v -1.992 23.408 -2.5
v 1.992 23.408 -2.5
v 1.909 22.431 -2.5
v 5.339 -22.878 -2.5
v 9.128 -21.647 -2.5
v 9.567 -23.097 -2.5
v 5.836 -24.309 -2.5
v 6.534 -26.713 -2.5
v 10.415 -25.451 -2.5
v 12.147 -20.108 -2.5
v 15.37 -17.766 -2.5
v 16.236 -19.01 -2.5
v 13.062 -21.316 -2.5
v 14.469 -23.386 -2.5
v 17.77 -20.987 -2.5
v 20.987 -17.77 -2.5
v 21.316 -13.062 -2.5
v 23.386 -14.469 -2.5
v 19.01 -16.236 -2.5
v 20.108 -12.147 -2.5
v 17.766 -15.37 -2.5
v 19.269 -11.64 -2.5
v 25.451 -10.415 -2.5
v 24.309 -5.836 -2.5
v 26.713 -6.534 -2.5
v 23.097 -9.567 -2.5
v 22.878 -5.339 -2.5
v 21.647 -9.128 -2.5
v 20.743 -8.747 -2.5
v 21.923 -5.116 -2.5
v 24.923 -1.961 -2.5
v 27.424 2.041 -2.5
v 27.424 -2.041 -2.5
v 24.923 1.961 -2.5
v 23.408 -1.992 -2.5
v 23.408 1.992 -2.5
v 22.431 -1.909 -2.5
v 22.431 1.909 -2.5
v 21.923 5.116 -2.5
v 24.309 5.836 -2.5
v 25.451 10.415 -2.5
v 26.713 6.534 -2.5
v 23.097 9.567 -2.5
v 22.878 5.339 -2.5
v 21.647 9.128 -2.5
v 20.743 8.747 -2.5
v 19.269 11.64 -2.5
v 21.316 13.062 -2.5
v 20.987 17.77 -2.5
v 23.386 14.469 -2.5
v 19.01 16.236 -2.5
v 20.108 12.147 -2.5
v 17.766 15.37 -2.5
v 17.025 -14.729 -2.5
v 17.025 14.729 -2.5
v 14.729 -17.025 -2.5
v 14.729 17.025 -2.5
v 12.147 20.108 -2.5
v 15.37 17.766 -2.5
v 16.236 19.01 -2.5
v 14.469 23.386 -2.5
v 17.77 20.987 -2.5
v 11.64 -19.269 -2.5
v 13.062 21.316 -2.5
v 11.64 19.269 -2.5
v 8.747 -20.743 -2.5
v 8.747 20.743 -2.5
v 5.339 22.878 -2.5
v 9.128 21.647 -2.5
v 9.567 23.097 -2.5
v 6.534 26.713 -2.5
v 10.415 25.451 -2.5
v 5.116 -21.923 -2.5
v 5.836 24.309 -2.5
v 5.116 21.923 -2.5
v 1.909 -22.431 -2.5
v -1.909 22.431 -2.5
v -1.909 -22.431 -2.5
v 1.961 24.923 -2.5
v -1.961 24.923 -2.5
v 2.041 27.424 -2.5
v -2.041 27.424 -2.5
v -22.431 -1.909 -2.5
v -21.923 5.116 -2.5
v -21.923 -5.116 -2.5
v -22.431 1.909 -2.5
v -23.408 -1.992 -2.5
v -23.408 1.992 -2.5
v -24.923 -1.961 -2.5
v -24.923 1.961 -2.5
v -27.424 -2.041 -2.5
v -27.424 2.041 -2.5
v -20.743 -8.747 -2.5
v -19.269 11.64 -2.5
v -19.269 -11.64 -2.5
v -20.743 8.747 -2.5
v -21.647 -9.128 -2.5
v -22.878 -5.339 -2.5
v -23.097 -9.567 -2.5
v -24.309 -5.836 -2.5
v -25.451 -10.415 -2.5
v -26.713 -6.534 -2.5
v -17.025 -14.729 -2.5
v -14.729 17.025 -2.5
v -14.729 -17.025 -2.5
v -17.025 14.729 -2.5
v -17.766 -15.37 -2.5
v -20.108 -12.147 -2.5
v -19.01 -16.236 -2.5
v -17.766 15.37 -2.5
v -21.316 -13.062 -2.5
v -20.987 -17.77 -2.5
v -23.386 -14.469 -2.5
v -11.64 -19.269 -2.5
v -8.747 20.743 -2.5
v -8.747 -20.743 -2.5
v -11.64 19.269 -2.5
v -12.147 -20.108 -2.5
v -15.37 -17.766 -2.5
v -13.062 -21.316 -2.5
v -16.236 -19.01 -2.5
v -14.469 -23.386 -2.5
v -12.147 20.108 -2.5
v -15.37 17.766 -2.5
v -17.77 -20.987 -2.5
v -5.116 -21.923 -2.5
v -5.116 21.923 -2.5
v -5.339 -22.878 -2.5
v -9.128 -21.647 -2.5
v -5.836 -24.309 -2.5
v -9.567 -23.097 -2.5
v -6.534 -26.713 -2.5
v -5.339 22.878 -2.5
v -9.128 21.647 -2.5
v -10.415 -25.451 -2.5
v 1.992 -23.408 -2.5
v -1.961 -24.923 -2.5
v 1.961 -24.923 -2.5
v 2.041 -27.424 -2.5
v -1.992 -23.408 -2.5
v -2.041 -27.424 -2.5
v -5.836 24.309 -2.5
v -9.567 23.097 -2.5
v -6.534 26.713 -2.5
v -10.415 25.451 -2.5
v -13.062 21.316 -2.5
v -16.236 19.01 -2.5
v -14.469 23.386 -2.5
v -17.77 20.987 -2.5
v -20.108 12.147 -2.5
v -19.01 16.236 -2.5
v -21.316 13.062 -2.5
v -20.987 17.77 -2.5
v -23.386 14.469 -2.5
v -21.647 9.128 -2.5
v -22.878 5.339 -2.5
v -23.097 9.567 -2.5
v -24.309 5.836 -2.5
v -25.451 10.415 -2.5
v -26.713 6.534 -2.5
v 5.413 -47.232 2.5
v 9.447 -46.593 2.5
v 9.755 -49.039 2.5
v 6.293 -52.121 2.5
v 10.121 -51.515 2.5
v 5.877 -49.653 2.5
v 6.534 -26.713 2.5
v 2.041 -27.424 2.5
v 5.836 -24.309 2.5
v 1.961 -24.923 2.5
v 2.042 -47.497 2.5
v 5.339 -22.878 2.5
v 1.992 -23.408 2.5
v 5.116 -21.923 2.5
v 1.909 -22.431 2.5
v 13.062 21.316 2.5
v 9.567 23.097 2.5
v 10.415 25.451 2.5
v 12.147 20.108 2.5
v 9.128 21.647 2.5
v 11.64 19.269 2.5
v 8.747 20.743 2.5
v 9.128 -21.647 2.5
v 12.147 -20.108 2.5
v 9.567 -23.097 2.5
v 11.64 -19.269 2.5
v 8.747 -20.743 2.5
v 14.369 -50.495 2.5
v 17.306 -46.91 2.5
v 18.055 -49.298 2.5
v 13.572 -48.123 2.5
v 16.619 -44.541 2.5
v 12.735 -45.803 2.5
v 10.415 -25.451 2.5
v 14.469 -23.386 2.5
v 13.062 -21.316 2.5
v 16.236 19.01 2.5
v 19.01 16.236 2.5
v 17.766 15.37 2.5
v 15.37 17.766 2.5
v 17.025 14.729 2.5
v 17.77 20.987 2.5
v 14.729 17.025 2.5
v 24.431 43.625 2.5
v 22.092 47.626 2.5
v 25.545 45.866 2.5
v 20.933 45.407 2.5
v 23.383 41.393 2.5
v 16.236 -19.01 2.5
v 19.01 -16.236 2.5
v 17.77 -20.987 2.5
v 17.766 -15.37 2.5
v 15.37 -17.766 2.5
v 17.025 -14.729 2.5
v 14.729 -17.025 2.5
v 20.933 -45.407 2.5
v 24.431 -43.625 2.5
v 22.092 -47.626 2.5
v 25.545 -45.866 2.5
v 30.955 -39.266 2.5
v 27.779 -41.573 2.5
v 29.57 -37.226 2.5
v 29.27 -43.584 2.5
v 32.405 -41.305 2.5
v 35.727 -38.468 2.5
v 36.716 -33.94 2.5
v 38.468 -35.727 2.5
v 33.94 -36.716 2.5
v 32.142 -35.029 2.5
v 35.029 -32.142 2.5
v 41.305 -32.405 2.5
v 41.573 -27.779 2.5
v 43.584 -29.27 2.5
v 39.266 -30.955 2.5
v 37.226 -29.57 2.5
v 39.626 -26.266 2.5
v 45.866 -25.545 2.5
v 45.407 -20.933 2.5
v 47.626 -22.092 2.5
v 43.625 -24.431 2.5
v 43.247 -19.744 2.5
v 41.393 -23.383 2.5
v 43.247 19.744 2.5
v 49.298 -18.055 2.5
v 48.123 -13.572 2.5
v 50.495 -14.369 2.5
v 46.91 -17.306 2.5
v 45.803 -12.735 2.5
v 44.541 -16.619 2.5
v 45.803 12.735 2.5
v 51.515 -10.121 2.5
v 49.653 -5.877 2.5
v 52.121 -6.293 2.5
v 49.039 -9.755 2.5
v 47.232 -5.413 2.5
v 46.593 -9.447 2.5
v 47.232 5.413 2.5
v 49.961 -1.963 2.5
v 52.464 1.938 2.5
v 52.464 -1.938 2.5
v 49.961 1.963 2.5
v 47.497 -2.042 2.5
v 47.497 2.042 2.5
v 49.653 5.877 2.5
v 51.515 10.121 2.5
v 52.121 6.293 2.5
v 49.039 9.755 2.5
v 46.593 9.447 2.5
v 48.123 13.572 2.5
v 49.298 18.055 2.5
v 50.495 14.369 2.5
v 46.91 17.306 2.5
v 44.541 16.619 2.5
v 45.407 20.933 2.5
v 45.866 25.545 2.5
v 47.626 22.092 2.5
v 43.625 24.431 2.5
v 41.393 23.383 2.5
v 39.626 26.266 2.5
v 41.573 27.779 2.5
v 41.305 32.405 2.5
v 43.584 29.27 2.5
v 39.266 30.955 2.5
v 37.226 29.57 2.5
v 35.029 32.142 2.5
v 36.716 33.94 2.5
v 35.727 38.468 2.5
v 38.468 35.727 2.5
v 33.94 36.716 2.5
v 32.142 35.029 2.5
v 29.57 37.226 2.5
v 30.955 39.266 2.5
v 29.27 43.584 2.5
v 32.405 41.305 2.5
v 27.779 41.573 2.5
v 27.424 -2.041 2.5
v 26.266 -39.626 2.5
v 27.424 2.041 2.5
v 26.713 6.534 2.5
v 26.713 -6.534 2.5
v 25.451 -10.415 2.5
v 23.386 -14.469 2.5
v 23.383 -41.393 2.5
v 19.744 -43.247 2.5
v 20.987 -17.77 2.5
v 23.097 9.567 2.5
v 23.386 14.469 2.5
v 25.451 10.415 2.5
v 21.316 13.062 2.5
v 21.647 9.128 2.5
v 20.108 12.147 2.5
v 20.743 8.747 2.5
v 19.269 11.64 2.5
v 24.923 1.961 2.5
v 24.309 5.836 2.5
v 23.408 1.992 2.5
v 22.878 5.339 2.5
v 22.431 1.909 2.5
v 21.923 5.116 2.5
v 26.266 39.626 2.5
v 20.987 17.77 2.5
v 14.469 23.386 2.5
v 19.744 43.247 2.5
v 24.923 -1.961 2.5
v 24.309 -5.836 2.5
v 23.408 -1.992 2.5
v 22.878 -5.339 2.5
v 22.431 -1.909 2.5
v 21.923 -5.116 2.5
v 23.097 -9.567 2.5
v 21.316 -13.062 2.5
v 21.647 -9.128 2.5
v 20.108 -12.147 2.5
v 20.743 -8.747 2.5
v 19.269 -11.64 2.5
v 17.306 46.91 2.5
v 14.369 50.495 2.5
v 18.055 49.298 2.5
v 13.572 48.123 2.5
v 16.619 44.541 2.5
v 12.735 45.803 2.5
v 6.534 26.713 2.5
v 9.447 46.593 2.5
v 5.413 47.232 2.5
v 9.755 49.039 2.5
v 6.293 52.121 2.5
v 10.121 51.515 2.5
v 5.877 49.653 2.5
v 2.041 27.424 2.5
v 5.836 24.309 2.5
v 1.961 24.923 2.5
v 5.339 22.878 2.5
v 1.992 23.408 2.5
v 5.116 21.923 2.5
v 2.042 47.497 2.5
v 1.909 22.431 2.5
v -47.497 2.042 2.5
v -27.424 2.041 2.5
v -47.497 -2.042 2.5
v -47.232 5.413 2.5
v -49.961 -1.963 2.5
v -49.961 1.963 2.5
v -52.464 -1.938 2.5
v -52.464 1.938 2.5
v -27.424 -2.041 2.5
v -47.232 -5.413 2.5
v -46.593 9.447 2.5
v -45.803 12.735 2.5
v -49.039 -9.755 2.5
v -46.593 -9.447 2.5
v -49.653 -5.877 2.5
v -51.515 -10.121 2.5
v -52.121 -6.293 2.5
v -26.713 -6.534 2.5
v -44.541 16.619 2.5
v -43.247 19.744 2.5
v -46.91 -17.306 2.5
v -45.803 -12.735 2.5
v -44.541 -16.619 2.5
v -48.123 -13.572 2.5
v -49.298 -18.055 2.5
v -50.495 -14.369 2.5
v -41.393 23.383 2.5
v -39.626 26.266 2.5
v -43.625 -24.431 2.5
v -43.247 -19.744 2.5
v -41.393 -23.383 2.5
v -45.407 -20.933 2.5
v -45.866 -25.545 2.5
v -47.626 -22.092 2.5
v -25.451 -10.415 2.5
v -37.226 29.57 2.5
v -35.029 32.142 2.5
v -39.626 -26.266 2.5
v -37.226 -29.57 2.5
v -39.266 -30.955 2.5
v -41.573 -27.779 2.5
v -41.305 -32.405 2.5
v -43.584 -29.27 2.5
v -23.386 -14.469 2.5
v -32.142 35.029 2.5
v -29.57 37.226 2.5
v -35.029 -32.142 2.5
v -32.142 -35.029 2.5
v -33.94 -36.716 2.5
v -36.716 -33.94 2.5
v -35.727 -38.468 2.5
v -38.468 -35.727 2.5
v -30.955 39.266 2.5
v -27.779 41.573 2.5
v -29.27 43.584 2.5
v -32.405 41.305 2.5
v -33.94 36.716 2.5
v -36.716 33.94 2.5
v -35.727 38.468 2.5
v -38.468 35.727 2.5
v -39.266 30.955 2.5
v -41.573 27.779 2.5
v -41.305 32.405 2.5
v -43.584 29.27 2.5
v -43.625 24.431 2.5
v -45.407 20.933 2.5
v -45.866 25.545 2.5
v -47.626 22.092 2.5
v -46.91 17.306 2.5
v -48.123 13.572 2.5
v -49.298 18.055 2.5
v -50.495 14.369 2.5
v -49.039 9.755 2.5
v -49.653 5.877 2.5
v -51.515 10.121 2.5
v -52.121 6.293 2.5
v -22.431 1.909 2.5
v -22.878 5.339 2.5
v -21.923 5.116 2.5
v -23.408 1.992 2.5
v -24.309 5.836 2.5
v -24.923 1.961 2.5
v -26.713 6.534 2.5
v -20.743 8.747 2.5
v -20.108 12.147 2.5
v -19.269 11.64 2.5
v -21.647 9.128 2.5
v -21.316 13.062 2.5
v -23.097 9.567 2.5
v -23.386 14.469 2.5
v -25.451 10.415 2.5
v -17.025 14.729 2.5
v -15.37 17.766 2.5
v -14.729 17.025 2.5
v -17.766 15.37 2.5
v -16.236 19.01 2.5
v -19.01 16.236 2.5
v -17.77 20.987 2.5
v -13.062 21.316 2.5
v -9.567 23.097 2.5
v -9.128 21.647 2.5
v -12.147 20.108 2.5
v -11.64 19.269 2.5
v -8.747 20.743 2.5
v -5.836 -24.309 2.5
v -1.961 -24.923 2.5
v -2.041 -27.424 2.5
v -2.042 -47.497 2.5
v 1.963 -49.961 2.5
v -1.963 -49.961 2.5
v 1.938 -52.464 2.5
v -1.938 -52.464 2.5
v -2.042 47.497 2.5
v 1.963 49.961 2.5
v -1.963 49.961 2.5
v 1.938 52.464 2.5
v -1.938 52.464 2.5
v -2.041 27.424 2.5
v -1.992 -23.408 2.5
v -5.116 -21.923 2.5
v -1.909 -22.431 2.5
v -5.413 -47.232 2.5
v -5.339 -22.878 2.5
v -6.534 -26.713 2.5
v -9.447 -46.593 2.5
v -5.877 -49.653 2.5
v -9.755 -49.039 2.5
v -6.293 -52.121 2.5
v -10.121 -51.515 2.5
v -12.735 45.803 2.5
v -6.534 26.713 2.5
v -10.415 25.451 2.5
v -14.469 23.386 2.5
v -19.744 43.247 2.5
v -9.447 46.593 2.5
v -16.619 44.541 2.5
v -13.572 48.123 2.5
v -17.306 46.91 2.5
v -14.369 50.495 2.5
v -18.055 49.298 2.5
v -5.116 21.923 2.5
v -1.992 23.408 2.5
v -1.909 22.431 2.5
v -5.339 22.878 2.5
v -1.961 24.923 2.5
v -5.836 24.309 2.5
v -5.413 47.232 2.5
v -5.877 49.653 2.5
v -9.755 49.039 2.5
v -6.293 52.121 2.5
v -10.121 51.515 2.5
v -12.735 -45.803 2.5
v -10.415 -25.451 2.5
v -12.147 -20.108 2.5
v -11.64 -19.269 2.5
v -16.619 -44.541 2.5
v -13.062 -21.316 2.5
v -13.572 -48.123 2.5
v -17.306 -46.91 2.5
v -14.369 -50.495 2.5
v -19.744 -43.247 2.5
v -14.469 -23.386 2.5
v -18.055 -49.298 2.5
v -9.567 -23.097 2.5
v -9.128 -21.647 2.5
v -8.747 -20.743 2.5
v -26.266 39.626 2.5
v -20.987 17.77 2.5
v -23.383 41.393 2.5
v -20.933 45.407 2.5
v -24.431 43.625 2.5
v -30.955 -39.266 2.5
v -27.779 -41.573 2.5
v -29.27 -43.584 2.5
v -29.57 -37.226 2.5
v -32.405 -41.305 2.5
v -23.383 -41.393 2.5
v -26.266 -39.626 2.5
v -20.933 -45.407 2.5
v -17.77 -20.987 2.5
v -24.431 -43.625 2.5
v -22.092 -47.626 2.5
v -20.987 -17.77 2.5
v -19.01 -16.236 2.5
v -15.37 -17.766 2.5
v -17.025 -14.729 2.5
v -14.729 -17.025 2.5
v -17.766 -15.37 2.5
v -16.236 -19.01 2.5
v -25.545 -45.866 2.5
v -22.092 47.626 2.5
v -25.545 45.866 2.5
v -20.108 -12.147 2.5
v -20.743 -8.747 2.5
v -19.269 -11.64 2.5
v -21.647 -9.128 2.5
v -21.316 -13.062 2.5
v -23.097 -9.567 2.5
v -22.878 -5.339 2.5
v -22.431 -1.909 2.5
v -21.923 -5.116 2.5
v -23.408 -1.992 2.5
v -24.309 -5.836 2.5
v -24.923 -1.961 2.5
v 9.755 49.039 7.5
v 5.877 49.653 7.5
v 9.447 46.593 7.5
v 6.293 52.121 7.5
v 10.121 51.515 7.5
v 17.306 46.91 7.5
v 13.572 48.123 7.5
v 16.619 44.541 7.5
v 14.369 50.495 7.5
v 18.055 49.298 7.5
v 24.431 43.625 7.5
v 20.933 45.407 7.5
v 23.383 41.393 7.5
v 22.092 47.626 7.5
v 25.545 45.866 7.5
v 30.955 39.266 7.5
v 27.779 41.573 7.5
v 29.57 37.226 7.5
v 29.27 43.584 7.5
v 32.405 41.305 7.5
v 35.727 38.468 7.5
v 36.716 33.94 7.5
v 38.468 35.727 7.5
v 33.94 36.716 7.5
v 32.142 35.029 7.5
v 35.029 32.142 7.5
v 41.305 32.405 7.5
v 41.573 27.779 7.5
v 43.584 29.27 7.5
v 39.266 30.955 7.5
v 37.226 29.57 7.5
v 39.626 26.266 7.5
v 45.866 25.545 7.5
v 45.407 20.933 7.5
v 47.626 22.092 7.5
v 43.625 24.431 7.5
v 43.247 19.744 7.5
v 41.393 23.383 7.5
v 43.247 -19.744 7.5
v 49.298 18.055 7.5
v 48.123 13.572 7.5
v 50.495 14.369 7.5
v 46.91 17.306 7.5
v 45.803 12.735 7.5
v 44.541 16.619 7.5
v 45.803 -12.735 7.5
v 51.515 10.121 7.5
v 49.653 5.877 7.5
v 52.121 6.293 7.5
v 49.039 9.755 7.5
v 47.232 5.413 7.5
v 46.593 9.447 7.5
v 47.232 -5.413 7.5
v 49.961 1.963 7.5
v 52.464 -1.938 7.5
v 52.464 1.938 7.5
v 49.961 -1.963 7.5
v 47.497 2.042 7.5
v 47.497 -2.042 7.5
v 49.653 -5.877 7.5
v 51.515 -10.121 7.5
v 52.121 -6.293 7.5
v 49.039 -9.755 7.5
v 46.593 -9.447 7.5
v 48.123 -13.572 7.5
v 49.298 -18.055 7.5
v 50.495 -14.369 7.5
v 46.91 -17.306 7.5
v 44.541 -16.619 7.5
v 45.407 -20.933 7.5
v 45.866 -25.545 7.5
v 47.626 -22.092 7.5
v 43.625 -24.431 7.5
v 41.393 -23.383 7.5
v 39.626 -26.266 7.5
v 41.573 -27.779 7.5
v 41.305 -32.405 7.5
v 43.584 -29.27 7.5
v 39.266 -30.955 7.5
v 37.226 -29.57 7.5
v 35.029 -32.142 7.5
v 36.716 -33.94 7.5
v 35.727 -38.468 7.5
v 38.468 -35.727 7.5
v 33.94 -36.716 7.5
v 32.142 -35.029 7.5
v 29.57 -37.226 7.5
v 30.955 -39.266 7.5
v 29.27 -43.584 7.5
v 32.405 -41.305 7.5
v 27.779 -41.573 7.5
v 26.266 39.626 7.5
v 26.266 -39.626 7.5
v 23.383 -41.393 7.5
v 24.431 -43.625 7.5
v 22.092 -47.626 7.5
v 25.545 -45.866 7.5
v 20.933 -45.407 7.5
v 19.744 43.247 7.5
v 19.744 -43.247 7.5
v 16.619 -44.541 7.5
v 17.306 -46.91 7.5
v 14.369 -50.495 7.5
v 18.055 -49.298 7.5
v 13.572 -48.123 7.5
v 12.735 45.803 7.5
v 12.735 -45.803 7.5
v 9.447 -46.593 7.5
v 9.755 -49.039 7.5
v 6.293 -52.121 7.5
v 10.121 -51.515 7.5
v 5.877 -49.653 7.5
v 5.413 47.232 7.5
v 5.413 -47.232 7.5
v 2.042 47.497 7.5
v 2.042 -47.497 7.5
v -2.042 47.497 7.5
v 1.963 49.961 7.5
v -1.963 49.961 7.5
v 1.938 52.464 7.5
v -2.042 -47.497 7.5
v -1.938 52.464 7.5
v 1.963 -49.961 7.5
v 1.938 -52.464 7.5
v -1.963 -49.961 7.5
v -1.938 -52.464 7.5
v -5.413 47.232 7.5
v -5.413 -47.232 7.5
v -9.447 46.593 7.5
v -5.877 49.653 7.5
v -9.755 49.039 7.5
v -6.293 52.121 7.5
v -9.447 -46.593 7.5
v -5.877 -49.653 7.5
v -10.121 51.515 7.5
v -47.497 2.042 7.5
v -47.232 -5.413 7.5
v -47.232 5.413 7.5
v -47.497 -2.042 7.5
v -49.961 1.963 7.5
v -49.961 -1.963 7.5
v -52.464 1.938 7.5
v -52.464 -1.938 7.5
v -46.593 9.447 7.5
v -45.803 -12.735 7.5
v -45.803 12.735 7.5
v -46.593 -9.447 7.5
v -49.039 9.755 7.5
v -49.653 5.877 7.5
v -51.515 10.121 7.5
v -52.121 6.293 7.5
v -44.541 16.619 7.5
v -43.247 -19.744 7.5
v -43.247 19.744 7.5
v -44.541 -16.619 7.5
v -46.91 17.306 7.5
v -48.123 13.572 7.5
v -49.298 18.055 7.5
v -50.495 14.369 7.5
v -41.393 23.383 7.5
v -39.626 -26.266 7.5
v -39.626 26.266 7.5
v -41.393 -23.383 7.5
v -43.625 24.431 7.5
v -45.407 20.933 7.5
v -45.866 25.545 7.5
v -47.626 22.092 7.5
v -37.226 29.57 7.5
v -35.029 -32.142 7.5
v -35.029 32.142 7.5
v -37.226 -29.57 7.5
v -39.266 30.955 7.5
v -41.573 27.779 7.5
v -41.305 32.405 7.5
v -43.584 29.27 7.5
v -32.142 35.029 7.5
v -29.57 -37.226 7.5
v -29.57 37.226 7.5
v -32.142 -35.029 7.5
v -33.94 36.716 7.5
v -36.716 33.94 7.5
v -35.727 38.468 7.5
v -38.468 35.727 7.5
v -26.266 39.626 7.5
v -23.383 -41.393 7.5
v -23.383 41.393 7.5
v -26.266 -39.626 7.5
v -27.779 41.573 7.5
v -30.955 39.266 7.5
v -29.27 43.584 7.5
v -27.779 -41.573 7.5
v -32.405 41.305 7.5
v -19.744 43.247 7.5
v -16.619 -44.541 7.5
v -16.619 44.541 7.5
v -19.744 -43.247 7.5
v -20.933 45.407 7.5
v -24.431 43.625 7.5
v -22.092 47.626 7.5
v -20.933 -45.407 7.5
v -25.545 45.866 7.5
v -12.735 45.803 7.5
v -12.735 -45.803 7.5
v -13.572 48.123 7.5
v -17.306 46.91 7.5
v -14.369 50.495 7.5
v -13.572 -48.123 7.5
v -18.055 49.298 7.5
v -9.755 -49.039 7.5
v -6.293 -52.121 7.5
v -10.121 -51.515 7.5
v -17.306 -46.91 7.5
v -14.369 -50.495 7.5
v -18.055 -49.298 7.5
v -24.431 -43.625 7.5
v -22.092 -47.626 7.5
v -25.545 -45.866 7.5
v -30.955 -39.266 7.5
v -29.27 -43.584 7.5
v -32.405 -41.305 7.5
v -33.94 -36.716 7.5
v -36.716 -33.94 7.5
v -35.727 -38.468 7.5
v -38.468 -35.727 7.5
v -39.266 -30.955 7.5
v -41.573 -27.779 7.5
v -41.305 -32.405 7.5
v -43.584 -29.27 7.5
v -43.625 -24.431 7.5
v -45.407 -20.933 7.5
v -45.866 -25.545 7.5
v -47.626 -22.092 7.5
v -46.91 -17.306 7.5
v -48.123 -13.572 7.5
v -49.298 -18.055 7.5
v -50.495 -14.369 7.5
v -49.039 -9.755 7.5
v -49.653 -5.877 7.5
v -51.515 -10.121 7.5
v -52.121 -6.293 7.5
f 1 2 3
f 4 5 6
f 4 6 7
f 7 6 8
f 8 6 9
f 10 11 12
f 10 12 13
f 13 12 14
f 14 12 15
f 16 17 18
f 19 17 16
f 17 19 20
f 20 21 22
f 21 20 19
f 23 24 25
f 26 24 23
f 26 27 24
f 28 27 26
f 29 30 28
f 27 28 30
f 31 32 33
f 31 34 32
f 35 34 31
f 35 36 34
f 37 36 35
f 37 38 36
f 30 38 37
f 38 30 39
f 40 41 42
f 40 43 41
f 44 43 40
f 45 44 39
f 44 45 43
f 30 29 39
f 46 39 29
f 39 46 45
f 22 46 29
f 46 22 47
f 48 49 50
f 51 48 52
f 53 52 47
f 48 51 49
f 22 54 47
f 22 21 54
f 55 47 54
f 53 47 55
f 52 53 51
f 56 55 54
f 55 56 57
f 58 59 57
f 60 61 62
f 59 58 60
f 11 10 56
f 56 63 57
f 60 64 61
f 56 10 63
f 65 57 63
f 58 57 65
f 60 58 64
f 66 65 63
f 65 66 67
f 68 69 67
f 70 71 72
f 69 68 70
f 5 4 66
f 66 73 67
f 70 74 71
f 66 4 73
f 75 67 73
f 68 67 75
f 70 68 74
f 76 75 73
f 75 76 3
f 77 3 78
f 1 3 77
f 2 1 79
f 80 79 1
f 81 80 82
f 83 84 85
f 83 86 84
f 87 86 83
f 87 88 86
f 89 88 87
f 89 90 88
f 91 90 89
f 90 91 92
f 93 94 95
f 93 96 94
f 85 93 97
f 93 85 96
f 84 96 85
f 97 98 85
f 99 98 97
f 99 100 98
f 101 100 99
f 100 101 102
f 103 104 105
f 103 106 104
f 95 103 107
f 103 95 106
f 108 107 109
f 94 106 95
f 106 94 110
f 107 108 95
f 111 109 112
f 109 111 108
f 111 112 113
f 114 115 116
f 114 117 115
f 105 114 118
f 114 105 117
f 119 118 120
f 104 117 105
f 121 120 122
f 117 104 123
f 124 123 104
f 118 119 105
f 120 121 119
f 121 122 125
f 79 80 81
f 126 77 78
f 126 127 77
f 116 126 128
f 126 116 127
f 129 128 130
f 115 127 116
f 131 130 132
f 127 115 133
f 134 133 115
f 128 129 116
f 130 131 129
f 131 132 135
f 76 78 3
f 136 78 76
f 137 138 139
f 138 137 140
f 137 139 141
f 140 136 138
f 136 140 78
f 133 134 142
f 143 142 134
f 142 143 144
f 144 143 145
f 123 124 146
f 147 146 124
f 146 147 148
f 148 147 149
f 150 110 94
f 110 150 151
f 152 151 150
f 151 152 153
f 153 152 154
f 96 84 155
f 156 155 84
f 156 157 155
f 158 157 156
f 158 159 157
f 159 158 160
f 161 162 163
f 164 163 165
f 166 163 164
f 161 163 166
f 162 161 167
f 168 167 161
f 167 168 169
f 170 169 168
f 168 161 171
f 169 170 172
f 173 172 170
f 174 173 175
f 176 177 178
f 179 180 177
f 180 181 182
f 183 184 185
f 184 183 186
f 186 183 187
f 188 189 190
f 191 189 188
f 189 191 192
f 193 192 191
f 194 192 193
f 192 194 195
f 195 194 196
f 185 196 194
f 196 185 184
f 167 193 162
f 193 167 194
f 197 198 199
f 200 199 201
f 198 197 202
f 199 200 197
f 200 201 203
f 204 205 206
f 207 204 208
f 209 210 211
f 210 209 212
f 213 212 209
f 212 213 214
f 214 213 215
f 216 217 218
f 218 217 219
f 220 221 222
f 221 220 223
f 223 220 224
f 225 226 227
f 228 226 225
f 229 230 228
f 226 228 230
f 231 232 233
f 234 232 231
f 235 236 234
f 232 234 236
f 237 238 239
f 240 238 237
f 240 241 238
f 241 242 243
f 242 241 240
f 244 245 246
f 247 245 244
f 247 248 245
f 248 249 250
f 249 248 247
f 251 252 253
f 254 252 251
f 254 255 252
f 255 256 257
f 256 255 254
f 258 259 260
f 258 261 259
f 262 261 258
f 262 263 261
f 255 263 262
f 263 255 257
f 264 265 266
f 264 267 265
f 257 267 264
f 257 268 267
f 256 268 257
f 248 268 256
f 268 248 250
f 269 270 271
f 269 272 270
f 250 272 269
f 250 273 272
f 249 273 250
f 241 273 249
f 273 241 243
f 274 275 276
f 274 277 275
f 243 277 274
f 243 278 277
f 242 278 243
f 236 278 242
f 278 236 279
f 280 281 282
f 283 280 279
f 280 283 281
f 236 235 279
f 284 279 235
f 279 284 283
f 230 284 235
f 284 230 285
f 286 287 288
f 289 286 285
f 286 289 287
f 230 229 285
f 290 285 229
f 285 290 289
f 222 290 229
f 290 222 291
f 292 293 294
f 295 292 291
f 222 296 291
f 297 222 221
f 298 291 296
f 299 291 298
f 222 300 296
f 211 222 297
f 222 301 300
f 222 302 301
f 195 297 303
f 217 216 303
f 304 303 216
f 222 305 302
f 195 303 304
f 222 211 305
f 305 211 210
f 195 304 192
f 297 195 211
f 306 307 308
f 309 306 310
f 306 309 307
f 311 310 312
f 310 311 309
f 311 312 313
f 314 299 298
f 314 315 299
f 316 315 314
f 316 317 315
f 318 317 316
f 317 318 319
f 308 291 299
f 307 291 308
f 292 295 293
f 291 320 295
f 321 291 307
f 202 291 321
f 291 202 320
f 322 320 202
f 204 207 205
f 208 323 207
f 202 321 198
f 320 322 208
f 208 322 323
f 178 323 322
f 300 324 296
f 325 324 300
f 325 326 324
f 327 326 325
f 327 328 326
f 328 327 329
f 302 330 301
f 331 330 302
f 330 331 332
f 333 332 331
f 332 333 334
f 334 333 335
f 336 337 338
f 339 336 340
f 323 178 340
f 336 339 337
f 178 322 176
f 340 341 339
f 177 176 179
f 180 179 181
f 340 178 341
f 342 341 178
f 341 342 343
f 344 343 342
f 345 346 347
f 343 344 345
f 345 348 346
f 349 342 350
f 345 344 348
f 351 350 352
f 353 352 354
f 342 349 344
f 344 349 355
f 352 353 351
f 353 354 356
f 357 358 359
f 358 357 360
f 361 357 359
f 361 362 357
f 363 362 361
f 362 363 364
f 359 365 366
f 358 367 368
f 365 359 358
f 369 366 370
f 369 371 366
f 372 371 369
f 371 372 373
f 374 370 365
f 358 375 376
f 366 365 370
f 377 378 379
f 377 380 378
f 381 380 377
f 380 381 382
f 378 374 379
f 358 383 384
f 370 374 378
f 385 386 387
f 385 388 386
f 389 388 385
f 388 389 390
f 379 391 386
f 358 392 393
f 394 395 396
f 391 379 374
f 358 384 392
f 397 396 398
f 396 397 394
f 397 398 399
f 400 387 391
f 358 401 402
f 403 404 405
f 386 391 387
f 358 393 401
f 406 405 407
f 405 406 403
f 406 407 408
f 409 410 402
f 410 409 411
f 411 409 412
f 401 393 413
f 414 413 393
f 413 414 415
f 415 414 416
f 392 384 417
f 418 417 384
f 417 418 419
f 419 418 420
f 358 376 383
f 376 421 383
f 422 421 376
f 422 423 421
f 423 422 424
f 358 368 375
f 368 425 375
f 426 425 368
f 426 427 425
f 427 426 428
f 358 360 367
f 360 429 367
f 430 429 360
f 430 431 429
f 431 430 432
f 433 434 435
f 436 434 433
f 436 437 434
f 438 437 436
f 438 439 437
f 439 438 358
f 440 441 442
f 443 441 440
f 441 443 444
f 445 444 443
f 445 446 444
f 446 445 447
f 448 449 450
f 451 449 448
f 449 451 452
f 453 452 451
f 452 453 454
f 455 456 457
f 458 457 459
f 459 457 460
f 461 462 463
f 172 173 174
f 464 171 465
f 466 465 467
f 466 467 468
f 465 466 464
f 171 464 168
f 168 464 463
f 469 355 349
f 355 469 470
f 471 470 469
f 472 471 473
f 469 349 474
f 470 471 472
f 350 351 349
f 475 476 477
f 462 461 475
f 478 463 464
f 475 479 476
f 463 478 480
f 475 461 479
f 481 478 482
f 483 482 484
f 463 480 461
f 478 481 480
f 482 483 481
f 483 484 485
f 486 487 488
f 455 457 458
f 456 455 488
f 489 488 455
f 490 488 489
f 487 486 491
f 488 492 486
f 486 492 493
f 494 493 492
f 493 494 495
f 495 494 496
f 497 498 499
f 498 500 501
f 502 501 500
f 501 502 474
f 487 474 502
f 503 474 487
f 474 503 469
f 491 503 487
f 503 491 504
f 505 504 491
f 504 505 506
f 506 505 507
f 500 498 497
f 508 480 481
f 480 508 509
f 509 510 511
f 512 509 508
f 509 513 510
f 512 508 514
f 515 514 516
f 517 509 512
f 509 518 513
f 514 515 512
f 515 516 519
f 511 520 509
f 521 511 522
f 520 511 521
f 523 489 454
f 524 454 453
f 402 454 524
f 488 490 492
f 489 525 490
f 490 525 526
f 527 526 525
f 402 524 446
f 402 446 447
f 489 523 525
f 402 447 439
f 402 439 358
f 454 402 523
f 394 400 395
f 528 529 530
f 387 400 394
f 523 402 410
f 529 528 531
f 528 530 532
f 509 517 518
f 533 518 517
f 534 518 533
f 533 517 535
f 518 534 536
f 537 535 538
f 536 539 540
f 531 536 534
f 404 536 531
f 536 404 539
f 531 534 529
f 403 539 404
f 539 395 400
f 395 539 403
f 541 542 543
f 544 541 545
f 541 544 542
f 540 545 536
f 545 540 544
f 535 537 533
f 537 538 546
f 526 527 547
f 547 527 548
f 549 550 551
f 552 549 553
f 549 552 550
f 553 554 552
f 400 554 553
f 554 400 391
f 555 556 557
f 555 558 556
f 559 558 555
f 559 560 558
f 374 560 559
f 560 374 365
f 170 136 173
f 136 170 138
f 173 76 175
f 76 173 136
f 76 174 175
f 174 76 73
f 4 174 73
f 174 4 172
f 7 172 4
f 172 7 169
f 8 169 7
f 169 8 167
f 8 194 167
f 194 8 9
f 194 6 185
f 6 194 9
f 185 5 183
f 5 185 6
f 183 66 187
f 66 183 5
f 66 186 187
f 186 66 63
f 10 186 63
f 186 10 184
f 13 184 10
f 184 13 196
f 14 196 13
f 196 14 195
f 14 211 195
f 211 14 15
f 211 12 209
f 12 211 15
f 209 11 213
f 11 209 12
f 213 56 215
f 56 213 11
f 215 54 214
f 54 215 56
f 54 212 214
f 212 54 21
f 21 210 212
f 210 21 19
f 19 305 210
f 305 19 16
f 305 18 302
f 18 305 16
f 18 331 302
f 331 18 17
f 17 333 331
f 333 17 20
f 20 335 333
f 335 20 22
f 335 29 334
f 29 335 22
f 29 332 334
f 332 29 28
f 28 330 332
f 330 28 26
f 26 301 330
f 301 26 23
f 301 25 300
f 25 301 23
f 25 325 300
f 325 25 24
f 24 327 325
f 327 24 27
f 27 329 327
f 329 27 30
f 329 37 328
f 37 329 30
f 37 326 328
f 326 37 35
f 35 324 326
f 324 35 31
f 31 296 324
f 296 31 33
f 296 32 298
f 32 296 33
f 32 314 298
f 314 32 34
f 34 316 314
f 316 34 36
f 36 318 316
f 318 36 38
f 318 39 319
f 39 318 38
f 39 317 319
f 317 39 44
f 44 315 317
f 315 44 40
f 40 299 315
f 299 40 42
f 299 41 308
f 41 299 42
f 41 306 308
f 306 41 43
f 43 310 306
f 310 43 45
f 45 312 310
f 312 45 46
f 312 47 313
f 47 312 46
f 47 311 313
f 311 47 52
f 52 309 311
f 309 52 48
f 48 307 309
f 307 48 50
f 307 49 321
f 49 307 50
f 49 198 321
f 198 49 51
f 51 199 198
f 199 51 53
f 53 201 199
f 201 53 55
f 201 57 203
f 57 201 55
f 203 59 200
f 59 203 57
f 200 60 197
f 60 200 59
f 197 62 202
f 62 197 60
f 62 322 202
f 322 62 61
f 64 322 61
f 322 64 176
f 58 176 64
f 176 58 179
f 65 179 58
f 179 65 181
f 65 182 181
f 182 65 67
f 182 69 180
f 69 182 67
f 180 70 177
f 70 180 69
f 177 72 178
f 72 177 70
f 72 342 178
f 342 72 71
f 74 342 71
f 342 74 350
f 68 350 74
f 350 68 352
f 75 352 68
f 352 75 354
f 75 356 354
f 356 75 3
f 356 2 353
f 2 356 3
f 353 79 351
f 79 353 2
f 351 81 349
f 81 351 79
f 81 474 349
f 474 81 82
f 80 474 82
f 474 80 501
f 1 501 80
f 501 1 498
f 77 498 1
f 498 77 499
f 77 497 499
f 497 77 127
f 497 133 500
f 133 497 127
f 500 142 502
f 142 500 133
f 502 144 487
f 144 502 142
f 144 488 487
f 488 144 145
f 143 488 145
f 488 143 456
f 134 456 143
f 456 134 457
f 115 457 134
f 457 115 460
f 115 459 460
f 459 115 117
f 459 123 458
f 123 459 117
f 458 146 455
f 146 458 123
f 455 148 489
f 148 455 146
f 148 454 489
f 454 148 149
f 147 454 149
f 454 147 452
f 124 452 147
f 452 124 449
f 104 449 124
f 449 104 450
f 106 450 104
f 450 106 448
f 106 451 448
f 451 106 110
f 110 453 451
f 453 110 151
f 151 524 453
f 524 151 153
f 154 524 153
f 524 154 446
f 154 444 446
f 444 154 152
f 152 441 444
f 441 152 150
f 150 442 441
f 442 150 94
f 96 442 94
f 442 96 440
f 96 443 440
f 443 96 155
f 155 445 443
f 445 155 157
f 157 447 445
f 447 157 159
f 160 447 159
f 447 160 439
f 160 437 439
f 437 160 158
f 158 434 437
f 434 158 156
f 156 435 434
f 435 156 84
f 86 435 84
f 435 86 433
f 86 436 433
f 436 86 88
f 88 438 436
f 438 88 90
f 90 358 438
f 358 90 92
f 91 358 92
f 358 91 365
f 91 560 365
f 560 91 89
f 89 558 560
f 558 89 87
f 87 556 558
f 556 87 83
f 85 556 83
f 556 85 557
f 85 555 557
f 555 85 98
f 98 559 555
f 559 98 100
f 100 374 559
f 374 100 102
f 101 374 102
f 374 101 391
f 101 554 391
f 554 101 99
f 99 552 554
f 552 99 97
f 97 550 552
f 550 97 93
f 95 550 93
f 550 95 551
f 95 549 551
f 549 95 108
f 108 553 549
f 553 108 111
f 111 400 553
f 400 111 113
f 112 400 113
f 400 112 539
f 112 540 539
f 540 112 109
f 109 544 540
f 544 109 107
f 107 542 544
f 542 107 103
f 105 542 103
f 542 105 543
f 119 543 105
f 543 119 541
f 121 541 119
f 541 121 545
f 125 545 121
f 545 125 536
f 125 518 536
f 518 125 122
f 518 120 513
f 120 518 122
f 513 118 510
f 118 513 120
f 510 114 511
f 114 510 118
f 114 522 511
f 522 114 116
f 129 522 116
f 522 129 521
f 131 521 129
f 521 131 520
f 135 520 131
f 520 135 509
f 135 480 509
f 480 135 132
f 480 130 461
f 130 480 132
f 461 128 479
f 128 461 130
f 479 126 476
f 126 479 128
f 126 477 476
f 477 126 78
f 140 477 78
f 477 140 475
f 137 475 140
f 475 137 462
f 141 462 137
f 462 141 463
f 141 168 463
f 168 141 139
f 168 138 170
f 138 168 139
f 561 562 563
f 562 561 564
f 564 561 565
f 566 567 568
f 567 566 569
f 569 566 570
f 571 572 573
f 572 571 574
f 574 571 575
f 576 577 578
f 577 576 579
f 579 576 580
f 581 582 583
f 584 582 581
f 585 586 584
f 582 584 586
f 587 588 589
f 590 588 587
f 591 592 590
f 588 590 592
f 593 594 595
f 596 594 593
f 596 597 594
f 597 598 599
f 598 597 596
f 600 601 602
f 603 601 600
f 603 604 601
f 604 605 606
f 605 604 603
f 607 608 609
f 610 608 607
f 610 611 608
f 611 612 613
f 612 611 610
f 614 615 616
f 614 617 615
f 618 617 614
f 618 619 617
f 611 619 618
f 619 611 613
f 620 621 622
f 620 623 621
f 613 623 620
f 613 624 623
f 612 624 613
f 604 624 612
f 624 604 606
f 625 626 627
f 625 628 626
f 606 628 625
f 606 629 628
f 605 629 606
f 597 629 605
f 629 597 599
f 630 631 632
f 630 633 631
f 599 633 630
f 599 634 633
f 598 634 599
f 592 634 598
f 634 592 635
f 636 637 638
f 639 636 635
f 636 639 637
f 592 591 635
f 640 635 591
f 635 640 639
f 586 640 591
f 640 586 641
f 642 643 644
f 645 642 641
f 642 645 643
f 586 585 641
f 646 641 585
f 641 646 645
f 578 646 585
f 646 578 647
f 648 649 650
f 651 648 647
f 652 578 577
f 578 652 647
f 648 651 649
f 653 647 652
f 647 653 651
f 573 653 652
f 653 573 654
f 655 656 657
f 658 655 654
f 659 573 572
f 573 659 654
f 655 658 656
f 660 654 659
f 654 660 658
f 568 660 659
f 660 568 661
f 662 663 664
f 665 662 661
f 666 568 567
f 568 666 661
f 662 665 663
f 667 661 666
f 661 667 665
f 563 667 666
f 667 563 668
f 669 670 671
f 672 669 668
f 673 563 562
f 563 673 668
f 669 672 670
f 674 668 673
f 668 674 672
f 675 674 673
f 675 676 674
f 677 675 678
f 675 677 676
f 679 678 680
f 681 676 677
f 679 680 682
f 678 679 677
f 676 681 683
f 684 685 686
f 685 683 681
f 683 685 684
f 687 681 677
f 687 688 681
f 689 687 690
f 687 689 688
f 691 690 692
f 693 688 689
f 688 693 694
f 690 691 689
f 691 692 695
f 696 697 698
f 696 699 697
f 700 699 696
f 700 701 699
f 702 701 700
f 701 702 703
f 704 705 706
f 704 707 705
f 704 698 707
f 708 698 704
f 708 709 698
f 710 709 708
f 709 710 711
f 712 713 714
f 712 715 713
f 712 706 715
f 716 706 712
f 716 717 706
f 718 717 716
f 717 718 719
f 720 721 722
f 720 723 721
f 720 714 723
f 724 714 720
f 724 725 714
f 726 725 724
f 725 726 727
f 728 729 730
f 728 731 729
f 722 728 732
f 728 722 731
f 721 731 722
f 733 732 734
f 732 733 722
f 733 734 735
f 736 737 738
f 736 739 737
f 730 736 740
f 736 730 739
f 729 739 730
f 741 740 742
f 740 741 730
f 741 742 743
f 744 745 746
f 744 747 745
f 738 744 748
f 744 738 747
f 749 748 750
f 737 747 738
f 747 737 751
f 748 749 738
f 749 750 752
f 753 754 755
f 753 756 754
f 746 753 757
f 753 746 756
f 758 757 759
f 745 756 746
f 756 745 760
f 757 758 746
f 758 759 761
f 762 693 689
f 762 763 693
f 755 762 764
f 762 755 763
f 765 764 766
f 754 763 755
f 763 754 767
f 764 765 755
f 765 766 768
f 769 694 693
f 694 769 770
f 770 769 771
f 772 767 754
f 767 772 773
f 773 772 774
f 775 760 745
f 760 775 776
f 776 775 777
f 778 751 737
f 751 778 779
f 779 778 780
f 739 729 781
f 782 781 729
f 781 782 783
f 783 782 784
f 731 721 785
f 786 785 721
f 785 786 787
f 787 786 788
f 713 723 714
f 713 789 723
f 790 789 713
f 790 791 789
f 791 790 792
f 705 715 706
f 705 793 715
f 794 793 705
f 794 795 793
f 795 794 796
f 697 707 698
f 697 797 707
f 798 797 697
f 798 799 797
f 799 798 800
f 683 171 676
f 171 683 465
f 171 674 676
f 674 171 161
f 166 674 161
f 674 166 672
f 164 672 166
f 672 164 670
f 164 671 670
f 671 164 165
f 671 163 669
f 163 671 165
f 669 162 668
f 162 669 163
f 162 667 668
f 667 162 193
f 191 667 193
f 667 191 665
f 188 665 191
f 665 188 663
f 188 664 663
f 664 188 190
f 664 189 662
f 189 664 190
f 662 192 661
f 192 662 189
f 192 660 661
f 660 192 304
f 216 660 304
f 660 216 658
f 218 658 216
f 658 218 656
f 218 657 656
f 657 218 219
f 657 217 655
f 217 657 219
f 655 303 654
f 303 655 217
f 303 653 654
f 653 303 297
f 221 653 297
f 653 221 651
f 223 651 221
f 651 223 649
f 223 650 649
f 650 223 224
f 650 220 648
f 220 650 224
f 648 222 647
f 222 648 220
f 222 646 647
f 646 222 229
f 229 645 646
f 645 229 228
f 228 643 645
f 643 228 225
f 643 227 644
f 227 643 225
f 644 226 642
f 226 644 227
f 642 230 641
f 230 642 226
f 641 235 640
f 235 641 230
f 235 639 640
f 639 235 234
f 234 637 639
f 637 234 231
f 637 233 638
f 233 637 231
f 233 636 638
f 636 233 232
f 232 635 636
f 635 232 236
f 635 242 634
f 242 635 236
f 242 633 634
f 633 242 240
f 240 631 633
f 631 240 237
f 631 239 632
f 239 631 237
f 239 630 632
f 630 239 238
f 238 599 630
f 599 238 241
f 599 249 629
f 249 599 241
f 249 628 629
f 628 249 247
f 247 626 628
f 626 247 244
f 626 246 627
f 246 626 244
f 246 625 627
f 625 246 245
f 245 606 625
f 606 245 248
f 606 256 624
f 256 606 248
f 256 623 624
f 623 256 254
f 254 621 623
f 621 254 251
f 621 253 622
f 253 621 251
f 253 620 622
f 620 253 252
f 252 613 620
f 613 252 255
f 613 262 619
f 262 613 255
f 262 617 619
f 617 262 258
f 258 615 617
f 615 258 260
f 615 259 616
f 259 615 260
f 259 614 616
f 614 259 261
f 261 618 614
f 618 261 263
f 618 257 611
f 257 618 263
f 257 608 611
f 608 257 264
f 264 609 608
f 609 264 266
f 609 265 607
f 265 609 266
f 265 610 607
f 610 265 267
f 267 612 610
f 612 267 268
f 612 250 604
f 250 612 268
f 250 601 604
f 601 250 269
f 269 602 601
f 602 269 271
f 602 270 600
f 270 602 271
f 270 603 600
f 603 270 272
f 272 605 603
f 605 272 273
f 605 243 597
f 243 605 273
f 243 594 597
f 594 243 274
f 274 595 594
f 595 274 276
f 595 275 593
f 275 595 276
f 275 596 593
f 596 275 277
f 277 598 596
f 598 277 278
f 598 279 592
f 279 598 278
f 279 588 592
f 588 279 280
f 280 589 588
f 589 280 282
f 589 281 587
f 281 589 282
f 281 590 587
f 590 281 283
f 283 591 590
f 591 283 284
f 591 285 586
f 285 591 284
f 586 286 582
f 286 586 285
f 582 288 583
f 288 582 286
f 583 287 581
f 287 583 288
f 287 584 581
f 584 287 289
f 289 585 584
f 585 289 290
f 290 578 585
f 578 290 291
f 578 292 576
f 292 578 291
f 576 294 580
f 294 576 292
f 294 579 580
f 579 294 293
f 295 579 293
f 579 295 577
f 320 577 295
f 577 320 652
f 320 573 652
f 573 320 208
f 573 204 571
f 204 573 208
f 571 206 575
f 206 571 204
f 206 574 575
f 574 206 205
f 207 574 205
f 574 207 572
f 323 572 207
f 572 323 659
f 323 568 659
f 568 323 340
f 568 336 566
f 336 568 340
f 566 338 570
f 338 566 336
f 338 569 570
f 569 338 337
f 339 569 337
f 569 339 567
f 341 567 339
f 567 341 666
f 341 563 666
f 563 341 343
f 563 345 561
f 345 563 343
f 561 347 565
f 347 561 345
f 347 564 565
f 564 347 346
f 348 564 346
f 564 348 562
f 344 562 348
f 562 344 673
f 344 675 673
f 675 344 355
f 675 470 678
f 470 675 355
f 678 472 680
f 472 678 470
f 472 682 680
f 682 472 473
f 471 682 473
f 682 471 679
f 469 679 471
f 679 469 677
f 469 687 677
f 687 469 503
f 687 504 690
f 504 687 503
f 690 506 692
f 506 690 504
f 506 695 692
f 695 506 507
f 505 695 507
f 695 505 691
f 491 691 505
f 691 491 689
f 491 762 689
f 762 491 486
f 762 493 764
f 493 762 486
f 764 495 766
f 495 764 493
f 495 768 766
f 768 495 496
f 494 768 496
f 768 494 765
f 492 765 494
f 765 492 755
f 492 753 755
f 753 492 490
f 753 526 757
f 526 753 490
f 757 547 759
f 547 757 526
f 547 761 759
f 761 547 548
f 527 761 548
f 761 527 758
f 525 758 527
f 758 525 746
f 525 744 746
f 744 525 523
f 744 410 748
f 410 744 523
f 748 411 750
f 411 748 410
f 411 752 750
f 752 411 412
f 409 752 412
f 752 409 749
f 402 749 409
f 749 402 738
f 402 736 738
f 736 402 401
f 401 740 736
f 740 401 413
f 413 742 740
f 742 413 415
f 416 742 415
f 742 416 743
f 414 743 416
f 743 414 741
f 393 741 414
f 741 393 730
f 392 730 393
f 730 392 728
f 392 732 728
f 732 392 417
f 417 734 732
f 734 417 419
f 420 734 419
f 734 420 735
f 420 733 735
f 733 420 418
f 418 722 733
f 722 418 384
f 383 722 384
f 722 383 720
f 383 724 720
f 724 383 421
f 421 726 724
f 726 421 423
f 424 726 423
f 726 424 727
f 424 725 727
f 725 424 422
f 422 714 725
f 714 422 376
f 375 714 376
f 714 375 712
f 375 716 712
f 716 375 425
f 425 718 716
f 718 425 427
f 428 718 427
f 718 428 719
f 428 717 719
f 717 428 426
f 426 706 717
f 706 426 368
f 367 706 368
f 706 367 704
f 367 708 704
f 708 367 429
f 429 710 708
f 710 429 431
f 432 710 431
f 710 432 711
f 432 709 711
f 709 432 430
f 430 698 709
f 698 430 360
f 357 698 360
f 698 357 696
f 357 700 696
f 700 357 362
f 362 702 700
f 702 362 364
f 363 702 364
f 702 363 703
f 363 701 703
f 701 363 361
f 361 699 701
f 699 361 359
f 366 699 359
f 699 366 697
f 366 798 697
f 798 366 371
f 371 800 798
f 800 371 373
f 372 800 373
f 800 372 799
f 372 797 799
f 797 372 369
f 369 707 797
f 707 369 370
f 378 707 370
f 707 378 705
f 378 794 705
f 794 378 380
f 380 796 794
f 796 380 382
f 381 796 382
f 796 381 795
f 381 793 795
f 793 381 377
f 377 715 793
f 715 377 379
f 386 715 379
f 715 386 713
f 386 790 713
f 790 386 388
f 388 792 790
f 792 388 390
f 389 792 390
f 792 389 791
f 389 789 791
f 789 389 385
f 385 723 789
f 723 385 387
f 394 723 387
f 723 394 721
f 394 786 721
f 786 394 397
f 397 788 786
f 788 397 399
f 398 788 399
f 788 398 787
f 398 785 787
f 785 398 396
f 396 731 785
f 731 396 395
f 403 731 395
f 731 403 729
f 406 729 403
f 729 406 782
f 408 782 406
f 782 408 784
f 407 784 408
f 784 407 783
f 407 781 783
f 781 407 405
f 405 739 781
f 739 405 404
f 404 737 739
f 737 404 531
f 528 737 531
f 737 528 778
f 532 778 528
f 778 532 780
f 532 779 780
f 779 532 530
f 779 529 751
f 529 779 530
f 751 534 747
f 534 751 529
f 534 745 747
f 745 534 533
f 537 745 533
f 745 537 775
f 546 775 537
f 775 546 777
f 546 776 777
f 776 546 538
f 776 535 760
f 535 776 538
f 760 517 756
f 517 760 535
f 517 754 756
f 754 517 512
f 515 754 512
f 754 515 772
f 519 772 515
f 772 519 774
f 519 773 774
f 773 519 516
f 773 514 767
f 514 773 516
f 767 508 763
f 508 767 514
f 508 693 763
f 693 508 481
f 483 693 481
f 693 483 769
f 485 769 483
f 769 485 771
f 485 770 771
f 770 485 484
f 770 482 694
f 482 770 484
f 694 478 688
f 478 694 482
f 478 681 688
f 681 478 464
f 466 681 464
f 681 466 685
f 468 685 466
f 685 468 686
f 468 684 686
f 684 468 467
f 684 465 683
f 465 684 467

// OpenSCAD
// CQAsk: MCAD gears.scad inlined (LGPL-2.1) — involute spur reference.

// Copyright 2010 D1plo1d
// LGPL 2.1


//test_involute_curve();
//test_gears();
//demo_3d_gears();

// Geometry Sources:
//	http://www.cartertools.com/involute.html
//	gears.py (inkscape extension: /usr/share/inkscape/extensions/gears.py)
// Usage:
//	Diametral pitch: Number of teeth per unit length.
//	Circular pitch: Length of the arc from one tooth to the next
//	Clearance: Radial distance between top of tooth on one gear to bottom of gap on another.

function pitch_circular2diameter(number_of_teeth,circular_pitch) = number_of_teeth * circular_pitch / 180;
function pitch_diametral2diameter(number_of_teeth,diametral_pitch) = number_of_teeth / diametral_pitch;

module gear(number_of_teeth,
		circular_pitch=false, diametral_pitch=false,
		pressure_angle=20, clearance = 0,
		verbose=false)
{
	if(verbose) {
		echo("gear arguments:");
		echo(str("  number_of_teeth: ", number_of_teeth));
		echo(str("  circular_pitch: ", circular_pitch));
		echo(str("  diametral_pitch: ", diametral_pitch));
		echo(str("  pressure_angle: ", pressure_angle));
		echo(str("  clearance: ", clearance));
	}
	if (circular_pitch==false && diametral_pitch==false) echo("MCAD ERROR: gear module needs either a diametral_pitch or circular_pitch");
	if(verbose) echo("gear calculations:");

	//Convert diametrial pitch to our native circular pitch
	circular_pitch = (circular_pitch!=false?circular_pitch:180/diametral_pitch);

	// Pitch diameter: Diameter of pitch circle.
	pitch_diameter  =  pitch_circular2diameter(number_of_teeth,circular_pitch);
	if(verbose) echo (str("  pitch_diameter: ", pitch_diameter));
	pitch_radius = pitch_diameter/2;

	// Base Circle
	base_diameter = pitch_diameter*cos(pressure_angle);
	if(verbose) echo (str("  base_diameter: ", base_diameter));
	base_radius = base_diameter/2;

	// Diametrial pitch: Number of teeth per unit length.
	pitch_diametrial = number_of_teeth / pitch_diameter;
	if(verbose) echo (str("  pitch_diametrial: ", pitch_diametrial));

	// Addendum: Radial distance from pitch circle to outside circle.
	addendum = 1/pitch_diametrial;
	if(verbose) echo (str("  addendum: ", addendum));

	//Outer Circle
	outer_radius = pitch_radius+addendum;
	outer_diameter = outer_radius*2;
	if(verbose) echo (str("  outer_diameter: ", outer_diameter));

	// Dedendum: Radial distance from pitch circle to root diameter
	dedendum = addendum + clearance;
	if(verbose) echo (str("  dedendum: ", dedendum));

	// Root diameter: Diameter of bottom of tooth spaces.
	root_radius = pitch_radius-dedendum;
	root_diameter = root_radius * 2;
	if(verbose) echo (str("  root_diameter: ", root_diameter));

	half_thick_angle = 360 / (4 * number_of_teeth);
	if(verbose) echo (str("  half_thick_angle: ", half_thick_angle));

	union()
	{
		rotate(half_thick_angle) circle($fn=number_of_teeth*2, r=root_radius*1.001);

		for (i= [1:number_of_teeth])
		//for (i = [0])
		{
			rotate([0,0,i*360/number_of_teeth])
			{
				involute_gear_tooth(
					pitch_radius = pitch_radius,
					root_radius = root_radius,
					base_radius = base_radius,
					outer_radius = outer_radius,
					half_thick_angle = half_thick_angle);
			}
		}
	}
}


module involute_gear_tooth(
					pitch_radius,
					root_radius,
					base_radius,
					outer_radius,
					half_thick_angle
					)
{
	pitch_to_base_angle  = involute_intersect_angle( base_radius, pitch_radius );

	outer_to_base_angle = involute_intersect_angle( base_radius, outer_radius );

	base1 = 0 - pitch_to_base_angle - half_thick_angle;
	pitch1 = 0 - half_thick_angle;
	outer1 = outer_to_base_angle - pitch_to_base_angle - half_thick_angle;

	b1 = polar_to_cartesian([ base1, base_radius ]);
	p1 = polar_to_cartesian([ pitch1, pitch_radius ]);
	o1 = polar_to_cartesian([ outer1, outer_radius ]);

	b2 = polar_to_cartesian([ -base1, base_radius ]);
	p2 = polar_to_cartesian([ -pitch1, pitch_radius ]);
	o2 = polar_to_cartesian([ -outer1, outer_radius ]);

	// ( root_radius > base_radius variables )
		pitch_to_root_angle = pitch_to_base_angle - involute_intersect_angle(base_radius, root_radius );
		root1 = pitch1 - pitch_to_root_angle;
		root2 = -pitch1 + pitch_to_root_angle;
		r1_t =  polar_to_cartesian([ root1, root_radius ]);
		r2_t =  polar_to_cartesian([ -root1, root_radius ]);

	// ( else )
		r1_f =  polar_to_cartesian([ base1, root_radius ]);
		r2_f =  polar_to_cartesian([ -base1, root_radius ]);

	if (root_radius > base_radius)
	{
		//echo("true");
		polygon( points = [
			r1_t,p1,o1,o2,p2,r2_t
		], convexity = 3);
	}
	else
	{
		polygon( points = [
			r1_f, b1,p1,o1,o2,p2,b2,r2_f
		], convexity = 3);
	}

}

// Mathematical Functions
//===============

// Finds the angle of the involute about the base radius at the given distance (radius) from it's center.
//source: http://www.mathhelpforum.com/math-help/geometry/136011-circle-involute-solving-y-any-given-x.html

function involute_intersect_angle(base_radius, radius) = sqrt( pow(radius/base_radius,2) - 1);



// Polar coord [angle, radius] to cartesian coord [x,y]

function polar_to_cartesian(polar) = [
	polar[1]*cos(polar[0]),
	polar[1]*sin(polar[0])
];


// Test Cases
//===============

module test_gears()
{
	gear(number_of_teeth=51,circular_pitch=200);
	translate([0, 50])gear(number_of_teeth=17,circular_pitch=200);
	translate([-50,0]) gear(number_of_teeth=17,diametral_pitch=1);
}

module demo_3d_gears()
{
	//double helical gear
	translate([50,0])
	{
	linear_extrude(height = 10, center = true, convexity = 10, twist = -45)
	 gear(number_of_teeth=17,diametral_pitch=1);
	translate([0,0,10])
        rotate([0,180,180/17])
        linear_extrude(height = 10, center = true, convexity = 10, twist = 45)
	 gear(number_of_teeth=17,diametral_pitch=1);
	}

	//spur gear
	translate([0,-50]) linear_extrude(height = 10, center = true, convexity = 10, twist = 0)
	 gear(number_of_teeth=17,diametral_pitch=1);

}

module test_involute_curve()
{
	for (i=[0,1,2,3,4,5,6,7,8,9,10,11,12,13,14,15])
	{
		translate(polar_to_cartesian([involute_intersect_angle( 0.1,i) , i ])) circle($fn=15, r=0.5);
	}
}


p0_teeth = 20;
p0_pitch_module = 2.5;
p0_face_width = 5.0;
p0_pressure_angle = 20.0;
p1_teeth = 40;
p1_pitch_module = 2.5;
p1_face_width = 5.0;
p1_pressure_angle = 20.0;

module part_0() {
  circular_pitch_mc = 180 * p0_pitch_module;
  linear_extrude(height = p0_face_width, center = true, convexity = 10)
    gear(number_of_teeth = p0_teeth, circular_pitch = circular_pitch_mc, pressure_angle = p0_pressure_angle);
}

module part_1() {
  circular_pitch_mc = 180 * p1_pitch_module;
  linear_extrude(height = p1_face_width, center = true, convexity = 10)
    gear(number_of_teeth = p1_teeth, circular_pitch = circular_pitch_mc, pressure_angle = p1_pressure_angle);
}

union() {
  translate([0.0, 0.0, 0.0])
  rotate([0.0, 0.0, 0.0]) {
    part_0();
  }
  translate([0.0, 0.0, 5.0])
  rotate([0.0, 0.0, 0.0]) {
    part_1();
  }
}
